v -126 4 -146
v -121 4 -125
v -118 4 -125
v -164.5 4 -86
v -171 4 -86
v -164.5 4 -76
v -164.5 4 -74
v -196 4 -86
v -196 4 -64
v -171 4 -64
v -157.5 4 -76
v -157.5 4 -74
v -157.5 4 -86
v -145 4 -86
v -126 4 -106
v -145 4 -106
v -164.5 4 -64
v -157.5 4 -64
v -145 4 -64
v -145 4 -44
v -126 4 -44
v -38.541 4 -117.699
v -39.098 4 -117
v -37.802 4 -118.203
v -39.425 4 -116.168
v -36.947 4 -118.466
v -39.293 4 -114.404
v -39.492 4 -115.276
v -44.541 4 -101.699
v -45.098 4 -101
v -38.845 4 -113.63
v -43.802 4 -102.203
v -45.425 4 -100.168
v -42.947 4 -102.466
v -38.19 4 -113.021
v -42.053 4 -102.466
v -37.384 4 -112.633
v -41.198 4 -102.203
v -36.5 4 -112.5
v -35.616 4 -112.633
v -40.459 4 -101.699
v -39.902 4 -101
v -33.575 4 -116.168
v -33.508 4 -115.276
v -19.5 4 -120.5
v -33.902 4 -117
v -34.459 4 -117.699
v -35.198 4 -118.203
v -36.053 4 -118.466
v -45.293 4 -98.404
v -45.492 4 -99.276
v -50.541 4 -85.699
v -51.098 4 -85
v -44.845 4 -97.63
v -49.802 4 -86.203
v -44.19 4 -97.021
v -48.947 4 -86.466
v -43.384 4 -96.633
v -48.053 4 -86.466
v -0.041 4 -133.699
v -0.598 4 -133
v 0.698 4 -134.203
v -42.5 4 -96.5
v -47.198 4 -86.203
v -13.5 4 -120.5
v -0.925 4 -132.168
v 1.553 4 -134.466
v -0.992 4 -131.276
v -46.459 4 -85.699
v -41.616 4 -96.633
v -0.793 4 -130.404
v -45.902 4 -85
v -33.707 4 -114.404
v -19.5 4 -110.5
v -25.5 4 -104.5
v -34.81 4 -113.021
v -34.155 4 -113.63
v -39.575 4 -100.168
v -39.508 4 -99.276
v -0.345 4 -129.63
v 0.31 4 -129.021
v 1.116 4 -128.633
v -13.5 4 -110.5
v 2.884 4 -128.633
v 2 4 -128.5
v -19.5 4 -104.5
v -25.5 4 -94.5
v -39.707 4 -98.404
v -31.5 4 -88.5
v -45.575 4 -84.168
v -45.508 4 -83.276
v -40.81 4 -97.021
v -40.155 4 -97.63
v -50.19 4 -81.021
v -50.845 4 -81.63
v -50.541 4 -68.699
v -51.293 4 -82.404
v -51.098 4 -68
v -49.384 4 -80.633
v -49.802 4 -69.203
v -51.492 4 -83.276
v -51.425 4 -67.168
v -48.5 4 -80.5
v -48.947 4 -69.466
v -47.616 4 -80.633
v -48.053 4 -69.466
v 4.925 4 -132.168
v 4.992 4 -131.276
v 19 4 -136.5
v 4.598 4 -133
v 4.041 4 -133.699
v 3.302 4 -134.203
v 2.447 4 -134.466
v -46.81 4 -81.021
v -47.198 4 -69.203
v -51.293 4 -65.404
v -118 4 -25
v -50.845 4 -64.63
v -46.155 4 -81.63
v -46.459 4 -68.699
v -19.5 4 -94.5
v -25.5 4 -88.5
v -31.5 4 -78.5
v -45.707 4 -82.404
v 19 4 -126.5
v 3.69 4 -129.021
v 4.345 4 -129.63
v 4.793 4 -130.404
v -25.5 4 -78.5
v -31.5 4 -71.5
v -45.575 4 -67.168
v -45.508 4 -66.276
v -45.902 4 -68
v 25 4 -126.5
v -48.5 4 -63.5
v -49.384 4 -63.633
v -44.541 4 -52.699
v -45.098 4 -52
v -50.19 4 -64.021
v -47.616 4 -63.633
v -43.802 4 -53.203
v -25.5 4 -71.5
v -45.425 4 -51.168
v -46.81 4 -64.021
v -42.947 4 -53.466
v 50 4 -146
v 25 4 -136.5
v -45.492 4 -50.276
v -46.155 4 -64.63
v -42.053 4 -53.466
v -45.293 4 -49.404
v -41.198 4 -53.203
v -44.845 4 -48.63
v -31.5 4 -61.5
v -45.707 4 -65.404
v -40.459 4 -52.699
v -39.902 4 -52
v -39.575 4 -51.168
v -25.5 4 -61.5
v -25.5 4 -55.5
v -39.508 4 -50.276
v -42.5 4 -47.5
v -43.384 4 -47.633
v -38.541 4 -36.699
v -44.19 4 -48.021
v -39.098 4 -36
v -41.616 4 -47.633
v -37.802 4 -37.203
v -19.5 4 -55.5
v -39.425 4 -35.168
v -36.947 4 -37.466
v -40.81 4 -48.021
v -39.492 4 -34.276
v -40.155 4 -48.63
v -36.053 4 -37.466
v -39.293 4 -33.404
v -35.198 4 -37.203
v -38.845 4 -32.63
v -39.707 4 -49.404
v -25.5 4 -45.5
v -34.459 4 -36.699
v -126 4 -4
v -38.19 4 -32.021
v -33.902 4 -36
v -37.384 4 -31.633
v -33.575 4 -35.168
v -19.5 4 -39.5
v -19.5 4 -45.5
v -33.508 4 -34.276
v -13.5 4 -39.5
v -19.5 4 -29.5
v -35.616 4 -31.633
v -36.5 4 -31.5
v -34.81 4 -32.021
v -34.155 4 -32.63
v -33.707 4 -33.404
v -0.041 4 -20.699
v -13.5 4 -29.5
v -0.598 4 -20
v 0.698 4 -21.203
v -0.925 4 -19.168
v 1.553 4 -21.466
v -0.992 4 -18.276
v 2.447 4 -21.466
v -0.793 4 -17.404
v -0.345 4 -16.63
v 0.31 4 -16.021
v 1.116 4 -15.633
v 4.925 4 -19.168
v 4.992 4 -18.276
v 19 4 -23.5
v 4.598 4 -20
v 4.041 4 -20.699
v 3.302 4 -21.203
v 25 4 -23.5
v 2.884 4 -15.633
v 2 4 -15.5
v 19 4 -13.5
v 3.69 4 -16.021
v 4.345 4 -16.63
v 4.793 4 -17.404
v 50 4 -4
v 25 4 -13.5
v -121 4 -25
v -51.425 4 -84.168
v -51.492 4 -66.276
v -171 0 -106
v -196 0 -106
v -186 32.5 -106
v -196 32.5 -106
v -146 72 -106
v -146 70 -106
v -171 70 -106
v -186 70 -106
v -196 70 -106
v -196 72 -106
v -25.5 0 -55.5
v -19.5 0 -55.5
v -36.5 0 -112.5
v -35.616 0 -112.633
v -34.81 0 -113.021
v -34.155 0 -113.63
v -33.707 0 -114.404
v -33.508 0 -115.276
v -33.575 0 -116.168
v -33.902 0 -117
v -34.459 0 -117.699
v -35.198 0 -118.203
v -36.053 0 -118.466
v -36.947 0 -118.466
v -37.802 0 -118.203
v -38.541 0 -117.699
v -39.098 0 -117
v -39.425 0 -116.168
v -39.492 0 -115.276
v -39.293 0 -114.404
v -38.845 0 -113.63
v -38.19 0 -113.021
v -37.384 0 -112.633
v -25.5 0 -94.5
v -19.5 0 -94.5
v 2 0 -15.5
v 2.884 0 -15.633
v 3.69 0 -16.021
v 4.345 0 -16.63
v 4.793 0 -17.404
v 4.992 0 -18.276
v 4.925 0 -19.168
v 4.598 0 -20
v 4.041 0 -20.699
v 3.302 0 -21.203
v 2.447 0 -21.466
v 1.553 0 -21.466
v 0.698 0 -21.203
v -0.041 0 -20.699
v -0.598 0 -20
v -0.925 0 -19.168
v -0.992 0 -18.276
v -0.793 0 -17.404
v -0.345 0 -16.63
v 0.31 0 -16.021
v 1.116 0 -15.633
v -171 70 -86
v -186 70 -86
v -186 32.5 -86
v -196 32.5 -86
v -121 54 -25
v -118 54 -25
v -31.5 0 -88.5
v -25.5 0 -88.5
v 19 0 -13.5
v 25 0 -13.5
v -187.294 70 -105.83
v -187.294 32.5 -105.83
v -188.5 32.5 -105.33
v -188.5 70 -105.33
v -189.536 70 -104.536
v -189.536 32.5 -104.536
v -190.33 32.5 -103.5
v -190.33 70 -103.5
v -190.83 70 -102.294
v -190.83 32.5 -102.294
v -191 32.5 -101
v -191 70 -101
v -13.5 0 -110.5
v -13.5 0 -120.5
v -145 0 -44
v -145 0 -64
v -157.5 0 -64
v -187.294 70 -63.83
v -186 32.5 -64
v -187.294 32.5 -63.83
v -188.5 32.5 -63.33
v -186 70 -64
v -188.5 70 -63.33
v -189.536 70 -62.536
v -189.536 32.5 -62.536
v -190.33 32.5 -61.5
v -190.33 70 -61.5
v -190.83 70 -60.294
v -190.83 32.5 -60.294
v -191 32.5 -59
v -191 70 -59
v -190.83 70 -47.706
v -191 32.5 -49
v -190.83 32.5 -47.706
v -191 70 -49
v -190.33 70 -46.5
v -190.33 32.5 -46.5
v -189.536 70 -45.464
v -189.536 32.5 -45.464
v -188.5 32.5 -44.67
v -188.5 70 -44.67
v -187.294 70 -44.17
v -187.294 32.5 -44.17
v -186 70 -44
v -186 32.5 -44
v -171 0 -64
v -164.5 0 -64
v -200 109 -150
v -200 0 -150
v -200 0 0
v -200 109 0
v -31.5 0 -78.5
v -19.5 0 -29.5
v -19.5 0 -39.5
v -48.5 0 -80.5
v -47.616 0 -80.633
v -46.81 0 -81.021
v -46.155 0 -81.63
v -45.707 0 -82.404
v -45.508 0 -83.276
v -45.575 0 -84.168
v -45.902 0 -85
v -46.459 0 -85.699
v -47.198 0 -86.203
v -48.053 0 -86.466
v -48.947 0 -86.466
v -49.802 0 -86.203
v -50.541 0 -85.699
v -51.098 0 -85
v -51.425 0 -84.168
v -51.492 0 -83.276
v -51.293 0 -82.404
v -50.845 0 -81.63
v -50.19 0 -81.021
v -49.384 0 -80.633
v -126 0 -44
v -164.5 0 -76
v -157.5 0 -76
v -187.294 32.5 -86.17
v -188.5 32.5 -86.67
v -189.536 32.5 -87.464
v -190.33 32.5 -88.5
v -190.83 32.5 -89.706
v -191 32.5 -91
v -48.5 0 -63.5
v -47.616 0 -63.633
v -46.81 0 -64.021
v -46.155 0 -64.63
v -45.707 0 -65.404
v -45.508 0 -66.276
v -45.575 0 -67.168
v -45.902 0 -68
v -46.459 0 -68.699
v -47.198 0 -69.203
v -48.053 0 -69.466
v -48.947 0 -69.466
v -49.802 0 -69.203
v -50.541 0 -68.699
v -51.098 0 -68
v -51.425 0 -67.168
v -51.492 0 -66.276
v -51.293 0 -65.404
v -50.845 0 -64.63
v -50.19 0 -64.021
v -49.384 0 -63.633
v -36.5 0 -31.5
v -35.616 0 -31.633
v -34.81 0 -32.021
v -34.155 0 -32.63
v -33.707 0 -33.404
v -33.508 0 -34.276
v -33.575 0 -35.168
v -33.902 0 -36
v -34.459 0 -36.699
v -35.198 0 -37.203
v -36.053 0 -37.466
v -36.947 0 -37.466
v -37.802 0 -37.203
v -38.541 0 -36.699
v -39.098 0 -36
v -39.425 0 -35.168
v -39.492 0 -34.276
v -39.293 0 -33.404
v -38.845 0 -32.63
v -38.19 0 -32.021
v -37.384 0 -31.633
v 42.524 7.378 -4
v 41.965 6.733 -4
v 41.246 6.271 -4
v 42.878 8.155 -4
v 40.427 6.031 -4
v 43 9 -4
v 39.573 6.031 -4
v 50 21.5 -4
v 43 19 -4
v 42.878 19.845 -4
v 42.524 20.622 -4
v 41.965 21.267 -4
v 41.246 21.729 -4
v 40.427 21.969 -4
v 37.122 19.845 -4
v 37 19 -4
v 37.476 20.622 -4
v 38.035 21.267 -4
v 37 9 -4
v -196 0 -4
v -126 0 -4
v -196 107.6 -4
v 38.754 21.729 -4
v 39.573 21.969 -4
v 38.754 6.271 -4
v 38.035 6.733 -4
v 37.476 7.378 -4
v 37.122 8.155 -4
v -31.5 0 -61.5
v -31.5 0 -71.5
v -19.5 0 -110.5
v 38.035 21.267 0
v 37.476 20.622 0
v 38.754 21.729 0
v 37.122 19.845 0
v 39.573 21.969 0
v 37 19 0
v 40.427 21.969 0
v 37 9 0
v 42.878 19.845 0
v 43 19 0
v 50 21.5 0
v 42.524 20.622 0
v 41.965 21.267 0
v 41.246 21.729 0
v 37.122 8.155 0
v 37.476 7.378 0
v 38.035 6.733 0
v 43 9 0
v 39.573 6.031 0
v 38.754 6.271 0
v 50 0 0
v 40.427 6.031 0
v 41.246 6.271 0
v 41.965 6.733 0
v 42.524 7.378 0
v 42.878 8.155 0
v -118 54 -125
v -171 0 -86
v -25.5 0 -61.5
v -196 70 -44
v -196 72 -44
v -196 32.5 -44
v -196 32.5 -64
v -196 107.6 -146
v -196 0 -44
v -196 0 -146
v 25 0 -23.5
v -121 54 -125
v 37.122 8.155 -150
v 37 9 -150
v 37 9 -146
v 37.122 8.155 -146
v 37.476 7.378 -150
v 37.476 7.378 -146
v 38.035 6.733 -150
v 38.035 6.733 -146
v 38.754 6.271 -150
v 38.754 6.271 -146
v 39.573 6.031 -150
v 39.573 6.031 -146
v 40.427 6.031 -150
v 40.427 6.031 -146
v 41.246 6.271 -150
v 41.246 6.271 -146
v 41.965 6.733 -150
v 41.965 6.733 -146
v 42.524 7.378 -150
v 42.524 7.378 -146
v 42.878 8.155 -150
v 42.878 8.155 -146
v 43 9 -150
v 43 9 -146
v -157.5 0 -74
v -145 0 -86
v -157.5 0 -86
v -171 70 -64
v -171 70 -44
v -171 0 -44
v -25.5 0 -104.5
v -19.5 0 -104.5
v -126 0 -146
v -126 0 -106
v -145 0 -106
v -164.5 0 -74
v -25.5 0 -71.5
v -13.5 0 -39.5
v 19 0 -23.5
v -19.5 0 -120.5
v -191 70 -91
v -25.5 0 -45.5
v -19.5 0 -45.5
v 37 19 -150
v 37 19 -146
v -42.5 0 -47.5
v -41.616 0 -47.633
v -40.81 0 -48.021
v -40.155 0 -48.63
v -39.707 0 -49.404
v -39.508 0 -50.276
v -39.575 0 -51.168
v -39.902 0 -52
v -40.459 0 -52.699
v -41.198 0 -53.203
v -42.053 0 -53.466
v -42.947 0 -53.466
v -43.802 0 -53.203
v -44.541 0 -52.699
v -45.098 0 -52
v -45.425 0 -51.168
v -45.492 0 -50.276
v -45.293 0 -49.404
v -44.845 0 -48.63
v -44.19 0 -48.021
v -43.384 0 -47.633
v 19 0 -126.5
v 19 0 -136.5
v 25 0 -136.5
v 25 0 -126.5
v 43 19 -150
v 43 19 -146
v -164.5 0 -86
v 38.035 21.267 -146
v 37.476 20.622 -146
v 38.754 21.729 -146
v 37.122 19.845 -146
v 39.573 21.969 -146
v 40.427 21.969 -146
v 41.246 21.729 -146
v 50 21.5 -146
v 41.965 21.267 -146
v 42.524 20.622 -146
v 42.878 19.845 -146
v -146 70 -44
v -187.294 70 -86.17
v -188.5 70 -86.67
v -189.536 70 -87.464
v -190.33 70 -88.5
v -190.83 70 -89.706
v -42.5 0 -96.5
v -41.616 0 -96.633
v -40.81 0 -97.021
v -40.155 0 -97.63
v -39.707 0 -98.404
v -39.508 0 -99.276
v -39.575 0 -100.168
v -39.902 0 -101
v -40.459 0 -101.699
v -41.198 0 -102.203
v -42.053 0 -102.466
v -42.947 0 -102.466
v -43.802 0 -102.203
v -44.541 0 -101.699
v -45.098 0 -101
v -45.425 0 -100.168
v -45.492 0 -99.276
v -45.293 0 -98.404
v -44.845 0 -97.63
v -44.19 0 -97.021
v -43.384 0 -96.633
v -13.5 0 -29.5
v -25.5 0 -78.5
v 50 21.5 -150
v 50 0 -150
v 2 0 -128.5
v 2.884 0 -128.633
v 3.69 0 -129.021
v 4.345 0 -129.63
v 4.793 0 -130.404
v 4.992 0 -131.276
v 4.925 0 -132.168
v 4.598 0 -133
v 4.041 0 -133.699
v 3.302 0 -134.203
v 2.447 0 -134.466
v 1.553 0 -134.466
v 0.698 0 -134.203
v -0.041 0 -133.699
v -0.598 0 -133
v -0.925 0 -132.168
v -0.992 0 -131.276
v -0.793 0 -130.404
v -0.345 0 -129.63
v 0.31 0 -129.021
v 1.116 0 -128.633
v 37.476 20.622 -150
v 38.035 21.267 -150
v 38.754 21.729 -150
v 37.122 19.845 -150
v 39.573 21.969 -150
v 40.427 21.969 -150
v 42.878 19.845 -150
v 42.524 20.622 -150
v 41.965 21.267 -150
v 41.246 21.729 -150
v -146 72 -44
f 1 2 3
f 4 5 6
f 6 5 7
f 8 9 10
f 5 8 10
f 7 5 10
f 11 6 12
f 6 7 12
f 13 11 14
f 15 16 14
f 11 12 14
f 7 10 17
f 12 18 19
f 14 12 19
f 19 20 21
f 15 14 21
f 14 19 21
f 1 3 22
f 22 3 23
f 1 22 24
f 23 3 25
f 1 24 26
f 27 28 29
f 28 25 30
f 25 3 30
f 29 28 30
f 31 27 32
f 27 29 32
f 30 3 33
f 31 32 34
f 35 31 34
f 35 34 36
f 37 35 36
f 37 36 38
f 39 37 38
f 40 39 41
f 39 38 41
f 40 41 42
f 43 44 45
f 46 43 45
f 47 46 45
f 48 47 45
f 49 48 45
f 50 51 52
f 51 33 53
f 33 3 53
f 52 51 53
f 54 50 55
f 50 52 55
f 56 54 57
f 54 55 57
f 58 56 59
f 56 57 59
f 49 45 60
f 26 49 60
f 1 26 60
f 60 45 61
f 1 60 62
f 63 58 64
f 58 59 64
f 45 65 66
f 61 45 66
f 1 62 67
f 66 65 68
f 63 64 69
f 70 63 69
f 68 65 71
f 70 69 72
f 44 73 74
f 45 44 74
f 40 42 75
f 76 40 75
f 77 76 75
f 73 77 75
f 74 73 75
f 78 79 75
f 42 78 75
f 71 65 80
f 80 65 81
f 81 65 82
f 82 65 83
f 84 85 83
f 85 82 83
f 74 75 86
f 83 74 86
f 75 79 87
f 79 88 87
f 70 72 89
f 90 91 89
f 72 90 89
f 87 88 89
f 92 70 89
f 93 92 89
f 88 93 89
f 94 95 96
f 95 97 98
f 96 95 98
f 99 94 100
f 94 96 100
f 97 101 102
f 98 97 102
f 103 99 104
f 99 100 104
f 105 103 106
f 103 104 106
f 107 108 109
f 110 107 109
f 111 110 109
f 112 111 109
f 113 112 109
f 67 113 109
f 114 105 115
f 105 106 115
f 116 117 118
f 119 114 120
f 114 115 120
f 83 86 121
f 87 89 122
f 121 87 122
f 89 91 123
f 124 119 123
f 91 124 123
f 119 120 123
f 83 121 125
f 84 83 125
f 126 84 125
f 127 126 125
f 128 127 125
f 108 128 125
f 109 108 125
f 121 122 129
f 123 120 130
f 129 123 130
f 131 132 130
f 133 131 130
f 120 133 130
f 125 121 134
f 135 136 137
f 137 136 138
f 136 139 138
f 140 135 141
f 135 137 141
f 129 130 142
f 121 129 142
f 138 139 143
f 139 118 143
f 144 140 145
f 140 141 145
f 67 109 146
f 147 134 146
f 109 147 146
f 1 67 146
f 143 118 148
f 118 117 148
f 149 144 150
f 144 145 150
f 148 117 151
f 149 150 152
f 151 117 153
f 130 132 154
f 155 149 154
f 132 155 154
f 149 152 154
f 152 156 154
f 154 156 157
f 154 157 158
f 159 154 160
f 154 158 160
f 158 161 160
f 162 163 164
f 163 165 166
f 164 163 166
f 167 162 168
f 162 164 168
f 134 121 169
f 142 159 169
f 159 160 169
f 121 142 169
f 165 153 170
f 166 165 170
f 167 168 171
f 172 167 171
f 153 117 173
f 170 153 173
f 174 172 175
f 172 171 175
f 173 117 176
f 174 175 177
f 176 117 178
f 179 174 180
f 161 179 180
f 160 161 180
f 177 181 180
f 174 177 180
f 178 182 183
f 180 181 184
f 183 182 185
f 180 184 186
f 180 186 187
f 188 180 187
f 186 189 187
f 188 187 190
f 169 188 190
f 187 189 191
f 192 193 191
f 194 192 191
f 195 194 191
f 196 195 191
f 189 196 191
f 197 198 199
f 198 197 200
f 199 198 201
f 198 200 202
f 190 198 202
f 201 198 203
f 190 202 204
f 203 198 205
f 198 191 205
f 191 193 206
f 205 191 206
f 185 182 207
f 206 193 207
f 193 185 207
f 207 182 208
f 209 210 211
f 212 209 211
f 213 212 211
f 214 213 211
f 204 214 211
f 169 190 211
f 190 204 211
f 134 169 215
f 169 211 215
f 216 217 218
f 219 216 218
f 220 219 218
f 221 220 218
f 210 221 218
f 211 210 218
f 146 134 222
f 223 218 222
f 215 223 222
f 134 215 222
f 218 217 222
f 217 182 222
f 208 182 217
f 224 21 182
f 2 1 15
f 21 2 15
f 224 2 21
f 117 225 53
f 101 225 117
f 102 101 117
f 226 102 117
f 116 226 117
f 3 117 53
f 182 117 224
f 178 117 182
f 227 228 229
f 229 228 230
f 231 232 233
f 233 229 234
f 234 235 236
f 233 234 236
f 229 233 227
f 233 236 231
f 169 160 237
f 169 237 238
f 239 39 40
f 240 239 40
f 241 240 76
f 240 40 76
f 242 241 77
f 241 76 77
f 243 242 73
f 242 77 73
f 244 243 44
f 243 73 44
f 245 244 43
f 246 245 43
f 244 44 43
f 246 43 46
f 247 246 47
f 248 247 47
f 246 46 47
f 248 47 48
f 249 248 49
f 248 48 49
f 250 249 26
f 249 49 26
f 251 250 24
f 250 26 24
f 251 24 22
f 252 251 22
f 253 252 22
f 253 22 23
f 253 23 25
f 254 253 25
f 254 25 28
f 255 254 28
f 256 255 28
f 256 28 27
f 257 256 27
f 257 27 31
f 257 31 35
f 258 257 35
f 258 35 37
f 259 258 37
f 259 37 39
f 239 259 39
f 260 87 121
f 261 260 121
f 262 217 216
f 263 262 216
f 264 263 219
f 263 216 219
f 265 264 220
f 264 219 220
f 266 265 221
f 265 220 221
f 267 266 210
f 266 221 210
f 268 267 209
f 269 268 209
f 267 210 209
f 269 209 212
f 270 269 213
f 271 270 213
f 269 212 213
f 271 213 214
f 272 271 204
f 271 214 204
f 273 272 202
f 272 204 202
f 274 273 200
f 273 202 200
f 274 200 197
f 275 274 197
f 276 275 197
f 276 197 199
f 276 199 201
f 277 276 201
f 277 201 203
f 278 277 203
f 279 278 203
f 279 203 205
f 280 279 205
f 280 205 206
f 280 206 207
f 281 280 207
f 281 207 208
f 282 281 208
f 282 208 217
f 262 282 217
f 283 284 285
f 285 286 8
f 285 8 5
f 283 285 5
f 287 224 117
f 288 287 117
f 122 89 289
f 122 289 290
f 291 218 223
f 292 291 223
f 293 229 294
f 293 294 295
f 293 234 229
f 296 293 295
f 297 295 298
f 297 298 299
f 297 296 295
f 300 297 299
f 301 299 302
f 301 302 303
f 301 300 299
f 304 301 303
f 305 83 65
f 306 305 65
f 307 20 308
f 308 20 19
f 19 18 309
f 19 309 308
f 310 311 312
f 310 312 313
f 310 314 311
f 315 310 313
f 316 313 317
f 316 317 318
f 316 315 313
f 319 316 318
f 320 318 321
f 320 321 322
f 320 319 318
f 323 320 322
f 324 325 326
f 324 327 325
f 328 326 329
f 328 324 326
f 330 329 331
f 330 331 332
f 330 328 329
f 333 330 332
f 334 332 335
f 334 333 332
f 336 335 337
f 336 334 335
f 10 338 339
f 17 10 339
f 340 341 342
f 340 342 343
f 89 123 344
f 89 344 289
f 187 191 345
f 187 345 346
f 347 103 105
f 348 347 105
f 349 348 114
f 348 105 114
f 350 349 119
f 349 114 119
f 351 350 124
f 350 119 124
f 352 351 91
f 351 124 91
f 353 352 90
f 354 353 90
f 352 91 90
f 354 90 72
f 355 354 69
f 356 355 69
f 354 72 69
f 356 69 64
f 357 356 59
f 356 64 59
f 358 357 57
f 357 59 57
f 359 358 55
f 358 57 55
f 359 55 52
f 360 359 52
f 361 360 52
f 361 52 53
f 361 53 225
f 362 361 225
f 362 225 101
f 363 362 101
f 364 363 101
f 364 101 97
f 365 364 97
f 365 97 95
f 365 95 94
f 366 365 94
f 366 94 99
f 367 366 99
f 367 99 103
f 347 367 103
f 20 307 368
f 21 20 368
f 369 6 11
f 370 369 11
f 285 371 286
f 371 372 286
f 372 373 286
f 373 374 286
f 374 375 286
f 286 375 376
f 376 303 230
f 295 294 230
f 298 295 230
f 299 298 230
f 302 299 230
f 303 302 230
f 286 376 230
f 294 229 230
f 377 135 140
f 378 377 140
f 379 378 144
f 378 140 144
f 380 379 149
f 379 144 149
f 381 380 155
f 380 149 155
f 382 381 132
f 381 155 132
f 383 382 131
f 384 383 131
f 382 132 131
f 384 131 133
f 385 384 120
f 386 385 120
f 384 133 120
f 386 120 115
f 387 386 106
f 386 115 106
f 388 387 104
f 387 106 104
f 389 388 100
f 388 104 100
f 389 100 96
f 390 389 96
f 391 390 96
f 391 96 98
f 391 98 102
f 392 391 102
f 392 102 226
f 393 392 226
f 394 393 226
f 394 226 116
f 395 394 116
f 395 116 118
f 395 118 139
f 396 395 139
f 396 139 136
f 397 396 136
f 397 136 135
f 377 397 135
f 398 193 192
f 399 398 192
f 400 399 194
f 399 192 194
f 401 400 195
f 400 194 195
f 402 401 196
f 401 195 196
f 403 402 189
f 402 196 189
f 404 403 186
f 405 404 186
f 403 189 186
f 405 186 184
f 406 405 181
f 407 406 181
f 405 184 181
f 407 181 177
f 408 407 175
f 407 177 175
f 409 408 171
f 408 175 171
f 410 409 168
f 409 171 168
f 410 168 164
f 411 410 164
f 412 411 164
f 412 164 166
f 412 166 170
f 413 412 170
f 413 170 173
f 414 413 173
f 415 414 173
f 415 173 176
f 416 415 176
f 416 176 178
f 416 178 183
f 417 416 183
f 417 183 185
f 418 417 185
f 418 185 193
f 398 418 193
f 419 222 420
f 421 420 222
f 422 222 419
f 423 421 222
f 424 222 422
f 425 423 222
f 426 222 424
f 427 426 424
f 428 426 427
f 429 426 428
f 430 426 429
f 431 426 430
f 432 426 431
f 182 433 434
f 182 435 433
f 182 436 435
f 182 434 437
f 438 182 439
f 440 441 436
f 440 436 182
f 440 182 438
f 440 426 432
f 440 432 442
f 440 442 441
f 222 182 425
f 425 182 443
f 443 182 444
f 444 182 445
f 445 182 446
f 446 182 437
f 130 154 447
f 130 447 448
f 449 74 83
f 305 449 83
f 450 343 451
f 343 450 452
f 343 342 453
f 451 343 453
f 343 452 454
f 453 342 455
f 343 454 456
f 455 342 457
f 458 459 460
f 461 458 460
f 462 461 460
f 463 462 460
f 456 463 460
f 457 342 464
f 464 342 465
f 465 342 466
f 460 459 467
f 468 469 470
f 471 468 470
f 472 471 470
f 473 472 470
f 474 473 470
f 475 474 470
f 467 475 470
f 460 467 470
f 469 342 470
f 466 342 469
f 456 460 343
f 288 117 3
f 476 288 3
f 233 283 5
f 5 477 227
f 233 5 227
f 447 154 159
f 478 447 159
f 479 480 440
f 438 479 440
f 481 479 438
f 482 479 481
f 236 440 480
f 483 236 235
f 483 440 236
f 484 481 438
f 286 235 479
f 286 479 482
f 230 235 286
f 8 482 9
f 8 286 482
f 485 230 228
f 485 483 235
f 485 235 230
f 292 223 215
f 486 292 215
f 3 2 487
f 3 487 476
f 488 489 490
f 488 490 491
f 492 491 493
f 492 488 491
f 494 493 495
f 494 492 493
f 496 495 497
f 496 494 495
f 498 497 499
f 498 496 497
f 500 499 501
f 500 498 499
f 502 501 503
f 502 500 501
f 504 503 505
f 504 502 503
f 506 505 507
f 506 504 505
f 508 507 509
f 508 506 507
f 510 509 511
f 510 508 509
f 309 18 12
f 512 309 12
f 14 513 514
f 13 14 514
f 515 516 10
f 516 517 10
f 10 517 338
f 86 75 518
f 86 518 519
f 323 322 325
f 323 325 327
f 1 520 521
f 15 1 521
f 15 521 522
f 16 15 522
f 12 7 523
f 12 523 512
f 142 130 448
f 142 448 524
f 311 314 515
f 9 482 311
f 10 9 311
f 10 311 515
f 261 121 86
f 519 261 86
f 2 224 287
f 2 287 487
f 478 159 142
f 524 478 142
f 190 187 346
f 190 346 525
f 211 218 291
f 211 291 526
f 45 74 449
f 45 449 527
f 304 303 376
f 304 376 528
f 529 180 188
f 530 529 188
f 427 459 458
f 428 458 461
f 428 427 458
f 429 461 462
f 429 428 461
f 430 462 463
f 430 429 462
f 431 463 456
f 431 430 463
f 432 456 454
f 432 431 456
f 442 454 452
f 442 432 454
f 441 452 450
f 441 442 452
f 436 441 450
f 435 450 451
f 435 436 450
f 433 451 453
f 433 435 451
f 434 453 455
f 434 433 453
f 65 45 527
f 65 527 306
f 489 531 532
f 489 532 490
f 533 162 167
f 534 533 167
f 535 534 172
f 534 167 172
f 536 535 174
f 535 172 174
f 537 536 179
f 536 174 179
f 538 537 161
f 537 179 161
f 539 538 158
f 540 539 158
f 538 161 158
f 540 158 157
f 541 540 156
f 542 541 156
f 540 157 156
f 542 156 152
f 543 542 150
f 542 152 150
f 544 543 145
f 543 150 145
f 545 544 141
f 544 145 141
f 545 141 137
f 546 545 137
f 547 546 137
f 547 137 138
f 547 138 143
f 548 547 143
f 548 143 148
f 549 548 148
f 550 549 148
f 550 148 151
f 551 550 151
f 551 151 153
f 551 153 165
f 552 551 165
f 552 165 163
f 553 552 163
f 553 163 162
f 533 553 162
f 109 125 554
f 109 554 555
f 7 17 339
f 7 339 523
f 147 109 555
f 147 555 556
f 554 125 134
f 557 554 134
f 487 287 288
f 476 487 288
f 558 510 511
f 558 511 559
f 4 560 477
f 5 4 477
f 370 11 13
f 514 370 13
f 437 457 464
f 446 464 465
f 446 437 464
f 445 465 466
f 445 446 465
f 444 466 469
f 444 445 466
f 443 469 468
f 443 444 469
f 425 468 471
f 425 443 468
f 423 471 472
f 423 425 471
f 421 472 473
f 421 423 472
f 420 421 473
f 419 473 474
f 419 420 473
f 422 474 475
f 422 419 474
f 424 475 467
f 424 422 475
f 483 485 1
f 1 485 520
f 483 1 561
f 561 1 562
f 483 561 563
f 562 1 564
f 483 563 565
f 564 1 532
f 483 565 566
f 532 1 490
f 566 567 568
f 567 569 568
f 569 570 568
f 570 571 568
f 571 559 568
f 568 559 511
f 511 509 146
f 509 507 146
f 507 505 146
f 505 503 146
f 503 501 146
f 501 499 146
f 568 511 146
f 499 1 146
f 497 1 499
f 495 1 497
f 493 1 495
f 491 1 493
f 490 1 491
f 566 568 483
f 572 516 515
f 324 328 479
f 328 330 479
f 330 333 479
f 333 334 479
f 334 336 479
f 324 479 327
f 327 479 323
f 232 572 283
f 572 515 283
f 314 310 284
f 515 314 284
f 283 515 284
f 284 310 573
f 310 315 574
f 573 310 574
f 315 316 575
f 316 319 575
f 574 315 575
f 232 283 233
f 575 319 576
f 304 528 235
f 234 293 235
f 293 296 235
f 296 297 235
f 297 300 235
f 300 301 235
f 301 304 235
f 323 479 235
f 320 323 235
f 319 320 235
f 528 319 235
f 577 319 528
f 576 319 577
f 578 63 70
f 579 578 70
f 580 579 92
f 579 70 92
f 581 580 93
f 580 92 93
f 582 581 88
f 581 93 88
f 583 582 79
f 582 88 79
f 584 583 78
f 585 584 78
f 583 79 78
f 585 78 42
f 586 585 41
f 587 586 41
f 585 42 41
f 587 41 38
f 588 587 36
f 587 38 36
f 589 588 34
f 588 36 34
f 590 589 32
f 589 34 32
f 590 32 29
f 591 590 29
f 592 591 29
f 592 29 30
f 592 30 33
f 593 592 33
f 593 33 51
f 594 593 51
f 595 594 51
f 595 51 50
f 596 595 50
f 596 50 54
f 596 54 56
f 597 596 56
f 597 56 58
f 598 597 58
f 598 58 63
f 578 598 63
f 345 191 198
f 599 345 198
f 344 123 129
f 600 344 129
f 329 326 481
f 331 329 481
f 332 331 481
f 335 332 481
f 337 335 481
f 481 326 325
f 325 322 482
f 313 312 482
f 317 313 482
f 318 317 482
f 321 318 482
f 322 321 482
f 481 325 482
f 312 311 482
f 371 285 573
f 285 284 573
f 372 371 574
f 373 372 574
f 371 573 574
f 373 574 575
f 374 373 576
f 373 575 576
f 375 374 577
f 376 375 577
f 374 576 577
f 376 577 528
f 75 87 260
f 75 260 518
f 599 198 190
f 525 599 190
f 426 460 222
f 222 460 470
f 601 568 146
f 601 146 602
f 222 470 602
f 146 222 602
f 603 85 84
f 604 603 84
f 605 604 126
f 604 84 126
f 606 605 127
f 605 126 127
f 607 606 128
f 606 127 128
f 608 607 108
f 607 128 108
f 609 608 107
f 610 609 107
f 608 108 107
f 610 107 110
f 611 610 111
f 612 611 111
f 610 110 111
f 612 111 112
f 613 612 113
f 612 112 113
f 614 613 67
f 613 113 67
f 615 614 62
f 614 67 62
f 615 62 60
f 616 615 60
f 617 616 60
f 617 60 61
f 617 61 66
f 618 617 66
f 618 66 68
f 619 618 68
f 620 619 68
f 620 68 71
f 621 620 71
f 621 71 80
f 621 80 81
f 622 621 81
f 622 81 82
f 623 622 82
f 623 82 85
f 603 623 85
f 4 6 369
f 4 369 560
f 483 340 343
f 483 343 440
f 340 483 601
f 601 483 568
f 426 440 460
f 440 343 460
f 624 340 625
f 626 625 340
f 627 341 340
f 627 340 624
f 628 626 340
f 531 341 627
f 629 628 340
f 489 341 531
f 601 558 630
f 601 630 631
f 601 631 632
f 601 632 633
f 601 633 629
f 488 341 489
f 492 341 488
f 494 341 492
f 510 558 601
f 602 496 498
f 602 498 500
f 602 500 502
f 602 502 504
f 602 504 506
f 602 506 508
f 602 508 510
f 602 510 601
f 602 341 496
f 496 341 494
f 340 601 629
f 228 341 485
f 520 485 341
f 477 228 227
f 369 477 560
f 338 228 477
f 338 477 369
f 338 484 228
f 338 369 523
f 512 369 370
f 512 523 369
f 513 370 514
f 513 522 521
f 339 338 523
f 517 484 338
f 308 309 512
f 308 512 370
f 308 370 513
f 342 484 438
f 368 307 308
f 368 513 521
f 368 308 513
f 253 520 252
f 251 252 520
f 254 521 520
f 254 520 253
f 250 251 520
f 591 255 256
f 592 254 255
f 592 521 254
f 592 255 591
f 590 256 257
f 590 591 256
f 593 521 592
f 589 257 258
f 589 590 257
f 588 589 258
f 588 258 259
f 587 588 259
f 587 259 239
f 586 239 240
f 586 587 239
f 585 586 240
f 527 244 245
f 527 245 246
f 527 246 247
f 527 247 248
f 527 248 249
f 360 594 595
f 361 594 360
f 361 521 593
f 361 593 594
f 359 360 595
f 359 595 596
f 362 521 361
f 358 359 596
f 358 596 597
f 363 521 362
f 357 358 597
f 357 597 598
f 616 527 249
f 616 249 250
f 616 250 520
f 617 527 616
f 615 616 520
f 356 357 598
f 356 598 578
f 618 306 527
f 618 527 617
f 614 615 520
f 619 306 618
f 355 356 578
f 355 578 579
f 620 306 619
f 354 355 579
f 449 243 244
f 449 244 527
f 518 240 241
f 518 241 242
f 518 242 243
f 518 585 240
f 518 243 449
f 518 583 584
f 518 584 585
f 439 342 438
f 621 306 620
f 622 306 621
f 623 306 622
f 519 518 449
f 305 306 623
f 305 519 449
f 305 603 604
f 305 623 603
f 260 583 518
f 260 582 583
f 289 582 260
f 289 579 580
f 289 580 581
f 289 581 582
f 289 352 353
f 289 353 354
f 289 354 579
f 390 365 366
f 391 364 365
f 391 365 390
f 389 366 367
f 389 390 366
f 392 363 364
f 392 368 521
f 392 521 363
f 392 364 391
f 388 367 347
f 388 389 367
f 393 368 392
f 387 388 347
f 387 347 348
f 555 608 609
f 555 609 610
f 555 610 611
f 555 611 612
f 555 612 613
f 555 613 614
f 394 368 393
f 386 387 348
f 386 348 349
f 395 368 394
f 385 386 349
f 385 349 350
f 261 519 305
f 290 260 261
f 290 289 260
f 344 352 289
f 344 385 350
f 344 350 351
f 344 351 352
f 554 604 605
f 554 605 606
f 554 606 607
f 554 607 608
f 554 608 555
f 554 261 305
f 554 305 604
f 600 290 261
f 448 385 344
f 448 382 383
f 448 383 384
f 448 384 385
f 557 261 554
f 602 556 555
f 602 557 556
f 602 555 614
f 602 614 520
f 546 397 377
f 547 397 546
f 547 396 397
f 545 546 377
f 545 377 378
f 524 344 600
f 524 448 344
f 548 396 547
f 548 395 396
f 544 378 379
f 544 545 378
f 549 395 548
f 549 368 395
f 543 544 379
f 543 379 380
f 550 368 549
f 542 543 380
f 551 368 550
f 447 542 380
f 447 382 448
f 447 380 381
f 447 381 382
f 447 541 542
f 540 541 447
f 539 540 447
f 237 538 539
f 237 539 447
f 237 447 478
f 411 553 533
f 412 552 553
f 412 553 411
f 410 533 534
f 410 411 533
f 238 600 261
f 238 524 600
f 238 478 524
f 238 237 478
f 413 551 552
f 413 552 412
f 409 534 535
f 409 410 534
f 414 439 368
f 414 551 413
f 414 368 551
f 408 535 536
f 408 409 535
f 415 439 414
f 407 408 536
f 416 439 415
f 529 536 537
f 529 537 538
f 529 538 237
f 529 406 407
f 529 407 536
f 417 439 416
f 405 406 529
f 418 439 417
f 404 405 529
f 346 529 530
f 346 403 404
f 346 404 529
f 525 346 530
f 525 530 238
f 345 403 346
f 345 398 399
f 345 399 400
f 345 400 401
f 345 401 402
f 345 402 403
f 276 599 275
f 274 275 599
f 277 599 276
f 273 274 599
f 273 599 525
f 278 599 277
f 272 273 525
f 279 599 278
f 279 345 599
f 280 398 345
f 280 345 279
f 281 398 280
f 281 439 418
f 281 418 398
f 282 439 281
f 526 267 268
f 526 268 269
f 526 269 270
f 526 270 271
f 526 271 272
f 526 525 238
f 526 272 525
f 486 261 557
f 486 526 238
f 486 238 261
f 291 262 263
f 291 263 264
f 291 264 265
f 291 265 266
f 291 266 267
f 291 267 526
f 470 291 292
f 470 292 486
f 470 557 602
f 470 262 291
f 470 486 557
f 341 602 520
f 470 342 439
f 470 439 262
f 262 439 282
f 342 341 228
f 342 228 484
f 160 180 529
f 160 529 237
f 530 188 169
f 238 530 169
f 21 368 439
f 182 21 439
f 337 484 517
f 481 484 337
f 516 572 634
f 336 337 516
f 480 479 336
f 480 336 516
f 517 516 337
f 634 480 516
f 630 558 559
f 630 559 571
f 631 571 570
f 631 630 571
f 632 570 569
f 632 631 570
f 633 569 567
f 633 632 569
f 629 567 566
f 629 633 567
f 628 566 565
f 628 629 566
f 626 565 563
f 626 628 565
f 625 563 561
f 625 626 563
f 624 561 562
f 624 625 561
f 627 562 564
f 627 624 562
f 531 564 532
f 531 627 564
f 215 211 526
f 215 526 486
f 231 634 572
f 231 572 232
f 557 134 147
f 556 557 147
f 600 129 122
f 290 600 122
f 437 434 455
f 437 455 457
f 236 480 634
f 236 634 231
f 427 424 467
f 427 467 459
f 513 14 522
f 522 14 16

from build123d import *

# Parameters (mm, degrees)
SKETCH1_W            = 200
SKETCH1_H            = 150
SKETCH1_W_2          = 192
SKETCH1_H_2          = 142
BOSS_EXTRUDE2_DEPTH  = 4
SKETCH2_W            = 200
SKETCH2_H            = 150
SKETCH2_W_2          = 192
SKETCH2_H_2          = 142
BOSS_EXTRUDE3_DEPTH  = 80
CUT_EXTRUDE1_DEPTH   = 150
SKETCH4_R            = 3
SKETCH4_W            = 6
SKETCH4_H            = 10
CUT_EXTRUDE2_DEPTH   = 10
SKETCH5_W            = 142
SKETCH5_H            = 11.4
CUT_EXTRUDE4_DEPTH   = 10
SKETCH6_W            = 25
SKETCH6_H            = 20
BOSS_EXTRUDE4_DEPTH  = 66
SKETCH7_W            = 5
SKETCH7_H            = 37.5
CUT_EXTRUDE5_DEPTH   = 66
BOSS_EXTRUDE6_DEPTH  = 4
BOSS_EXTRUDE7_DEPTH  = 4
BOSS_EXTRUDE8_DEPTH  = 142
FILLET1_R            = 5
FILLET2_R            = 5
FILLET3_R            = 5
SKETCH15_W           = 62
SKETCH15_H           = 2
BOSS_EXTRUDE9_DEPTH  = 50
SKETCH16_W           = 6
SKETCH16_H           = 20
CUT_EXTRUDE8_DEPTH   = 50
SKETCH17_W           = 7
SKETCH17_H           = 10
CUT_EXTRUDE9_DEPTH   = 50
SKETCH18_W           = 50
SKETCH18_H           = 150
BOSS_EXTRUDE10_DEPTH = 4
SKETCH19_W           = 50
SKETCH19_H           = 4
BOSS_EXTRUDE11_DEPTH = 35
CUT_EXTRUDE10_DEPTH  = 210
SKETCH21_R           = 3
SKETCH21_W           = 6
SKETCH21_H           = 10
CUT_EXTRUDE11_DEPTH  = 30
SKETCH22_W           = 3
SKETCH22_H           = 100
BOSS_EXTRUDE12_DEPTH = 50
CUT_EXTRUDE12_DEPTH  = 150


with BuildPart() as part:
    # Sketch1 → Boss-Extrude2 (new body)
    # profile 1 of 3: a face of its own
    with BuildSketch(Plane(origin=(0, 0, 0), x_dir=(1, 0, 0), z_dir=(0, 1, 0))):
        with Locations((-100, 75)):
            Rectangle(SKETCH1_W, SKETCH1_H)
        with Locations((-100, 75)):
            Rectangle(SKETCH1_W_2, SKETCH1_H_2, mode=Mode.SUBTRACT)
    # profile 2 of 3: a face of its own
    with BuildSketch(Plane(origin=(0, 0, 0), x_dir=(1, 0, 0), z_dir=(0, 1, 0))):
        Polygon((-4, 75), (-196, 75), (-196, 44), (-171, 44), (-171, 64), (-163, 64), (-163, 74), (-159, 74), (-159, 64), (-151, 64), (-151, 44), (-126, 44), (-126, 4), (-4, 4), align=None)
    # profile 3 of 3: a face of its own
    with BuildSketch(Plane(origin=(0, 0, 0), x_dir=(1, 0, 0), z_dir=(0, 1, 0))):
        Polygon((-196, 106), (-196, 75), (-4, 75), (-4, 146), (-126, 146), (-126, 106), (-151, 106), (-151, 86), (-159, 86), (-159, 76), (-163, 76), (-163, 86), (-171, 86), (-171, 106), align=None)
    extrude(amount=BOSS_EXTRUDE2_DEPTH)

    # Sketch2 → Boss-Extrude3 (add)
    with BuildSketch(Plane(origin=(0, 4, 0), x_dir=(1, 0, 0), z_dir=(0, 1, 0))):
        with Locations((-100, 75)):
            Rectangle(SKETCH2_W, SKETCH2_H)
        with Locations((-100, 75)):
            Rectangle(SKETCH2_W_2, SKETCH2_H_2, mode=Mode.SUBTRACT)
    extrude(amount=BOSS_EXTRUDE3_DEPTH)

    # Sketch3 → Cut-Extrude1 (cut)
    with BuildSketch(Plane.XY):
        Polygon((-200, 84), (0, 14), (0, 84), align=None)
    extrude(amount=-CUT_EXTRUDE1_DEPTH, mode=Mode.SUBTRACT)

    # Sketch4 → Cut-Extrude2 (cut)
    with BuildSketch(Plane(origin=(0, 4, 0), x_dir=(1, 0, 0), z_dir=(0, 1, 0))):
        with Locations(Location((-36.5, 115.5, 0), (0, 0, 270))):
            Circle(SKETCH4_R)
        with Locations(Location((-42.5, 99.5, 0), (0, 0, 270))):
            Circle(SKETCH4_R)
        with Locations(Location((-48.5, 83.5, 0), (0, 0, 270))):
            Circle(SKETCH4_R)
        with Locations(Location((-48.5, 66.5, 0), (0, 0, 270))):
            Circle(SKETCH4_R)
        with Locations(Location((-42.5, 50.5, 0), (0, 0, 270))):
            Circle(SKETCH4_R)
        with Locations(Location((-36.5, 34.5, 0), (0, 0, 270))):
            Circle(SKETCH4_R)
        with Locations((-16.5, 34.5)):
            Rectangle(SKETCH4_W, SKETCH4_H)
        with Locations((-16.5, 115.5)):
            Rectangle(SKETCH4_W, SKETCH4_H)
        with Locations((-22.5, 99.5)):
            Rectangle(SKETCH4_W, SKETCH4_H)
        with Locations((-22.5, 50.5)):
            Rectangle(SKETCH4_W, SKETCH4_H)
        with Locations((-28.5, 66.5)):
            Rectangle(SKETCH4_W, SKETCH4_H)
        with Locations((-28.5, 83.5)):
            Rectangle(SKETCH4_W, SKETCH4_H)
    extrude(amount=-CUT_EXTRUDE2_DEPTH, mode=Mode.SUBTRACT)

    # Sketch5 → Cut-Extrude4 (cut)
    with BuildSketch(Plane(origin=(0, 0, 0), x_dir=(0, 0, -1), z_dir=(1, 0, 0))):
        with Locations((75, 9.7)):
            Rectangle(SKETCH5_W, SKETCH5_H)
    extrude(amount=-CUT_EXTRUDE4_DEPTH, mode=Mode.SUBTRACT)

    # Sketch6 → Boss-Extrude4 (add)
    with BuildSketch(Plane(origin=(0, 4, 0), x_dir=(1, 0, 0), z_dir=(0, 1, 0))):
        with Locations((-183.5, 54)):
            Rectangle(SKETCH6_W, SKETCH6_H)
        with Locations((-183.5, 96)):
            Rectangle(SKETCH6_W, SKETCH6_H)
    extrude(amount=BOSS_EXTRUDE4_DEPTH)

    # Sketch7 → Cut-Extrude5 (cut)
    with BuildSketch(Plane(origin=(0, 0, -106), x_dir=(-1, 0, 0), z_dir=(0, 0, -1))):
        with Locations((193.5, 51.25)):
            Rectangle(SKETCH7_W, SKETCH7_H)
    extrude(amount=-CUT_EXTRUDE5_DEPTH, mode=Mode.SUBTRACT)

    # Sketch12 → Boss-Extrude6 (add)
    with BuildSketch(Plane.XY):
        Polygon((-200, 84), (-200, 109), (0, 39), (0, 14), align=None)
    extrude(amount=-BOSS_EXTRUDE6_DEPTH)

    # Sketch13 → Boss-Extrude7 (add)
    with BuildSketch(Plane(origin=(0, 0, -150), x_dir=(-1, 0, 0), z_dir=(0, 0, -1))):
        Polygon((0, 14), (0, 39), (200, 109), (200, 84), align=None)
    extrude(amount=-BOSS_EXTRUDE7_DEPTH)

    # Sketch14 → Boss-Extrude8 (add)
    with BuildSketch(Plane.XY.offset(-146)):
        Polygon((-200, 84), (-200, 109), (-196, 107.6), (-196, 82.6), align=None)
    extrude(amount=BOSS_EXTRUDE8_DEPTH)

    # Fillet1
    fillet1_edges = [part.edges().sort_by_distance(p)[0] for p in [
        (-191, 51.25, -106),
    ]]
    fillet(fillet1_edges, radius=FILLET1_R)

    # Fillet2
    fillet2_edges = [part.edges().sort_by_distance(p)[0] for p in [
        (-191, 51.25, -86),
    ]]
    fillet(fillet2_edges, radius=FILLET2_R)

    # Fillet3
    fillet3_edges = [part.edges().sort_by_distance(p)[0] for p in [
        (-191, 51.25, -44),
        (-191, 51.25, -64),
    ]]
    fillet(fillet3_edges, radius=FILLET3_R)

    # Sketch15 → Boss-Extrude9 (add)
    with BuildSketch(Plane(origin=(-196, 0, 0), x_dir=(0, 0, -1), z_dir=(1, 0, 0))):
        with Locations((75, 71)):
            Rectangle(SKETCH15_W, SKETCH15_H)
    extrude(amount=BOSS_EXTRUDE9_DEPTH)

    # Sketch16 → Cut-Extrude8 (cut)
    with BuildSketch(Plane(origin=(0, 4, 0), x_dir=(1, 0, 0), z_dir=(0, 1, 0))):
        with Locations((-148, 96)):
            Rectangle(SKETCH16_W, SKETCH16_H)
        with Locations((-148, 54)):
            Rectangle(SKETCH16_W, SKETCH16_H)
    extrude(amount=-CUT_EXTRUDE8_DEPTH, mode=Mode.SUBTRACT)

    # Sketch17 → Cut-Extrude9 (cut)
    with BuildSketch(Plane(origin=(0, 4, 0), x_dir=(1, 0, 0), z_dir=(0, 1, 0))):
        with Locations((-161, 69)):
            Rectangle(SKETCH17_W, SKETCH17_H)
        with Locations((-161, 81)):
            Rectangle(SKETCH17_W, SKETCH17_H)
    extrude(amount=-CUT_EXTRUDE9_DEPTH, mode=Mode.SUBTRACT)

    # Sketch18 → Boss-Extrude10 (add)
    with BuildSketch(Plane.XZ):
        with Locations((25, -75)):
            Rectangle(SKETCH18_W, SKETCH18_H)
    extrude(amount=-BOSS_EXTRUDE10_DEPTH)

    # Sketch19 → Boss-Extrude11 (add)
    with BuildSketch(Plane(origin=(0, 4, 0), x_dir=(1, 0, 0), z_dir=(0, 1, 0))):
        with Locations((25, 148)):
            Rectangle(SKETCH19_W, SKETCH19_H)
        with Locations((25, 2)):
            Rectangle(SKETCH19_W, SKETCH19_H)
    extrude(amount=BOSS_EXTRUDE11_DEPTH)

    # Sketch20 → Cut-Extrude10 (cut)
    with BuildSketch(Plane.XY):
        Polygon((0, 39), (50, 21.5), (50, 39), align=None)
    extrude(amount=-CUT_EXTRUDE10_DEPTH, mode=Mode.SUBTRACT)

    # Sketch21 → Cut-Extrude11 (cut)
    with BuildSketch(Plane(origin=(0, 4, 0), x_dir=(1, 0, 0), z_dir=(0, 1, 0))):
        with Locations(Location((2, 131.5, 0), (0, 0, 270))):
            Circle(SKETCH21_R)
        with Locations(Location((2, 18.5, 0), (0, 0, 270))):
            Circle(SKETCH21_R)
        with Locations((22, 18.5)):
            Rectangle(SKETCH21_W, SKETCH21_H)
        with Locations((22, 131.5)):
            Rectangle(SKETCH21_W, SKETCH21_H)
    extrude(amount=-CUT_EXTRUDE11_DEPTH, mode=Mode.SUBTRACT)

    # Sketch22 → Boss-Extrude12 (add)
    with BuildSketch(Plane(origin=(0, 4, 0), x_dir=(1, 0, 0), z_dir=(0, 1, 0))):
        with Locations((-119.5, 75)):
            Rectangle(SKETCH22_W, SKETCH22_H)
    extrude(amount=BOSS_EXTRUDE12_DEPTH)

    # Sketch23 → Cut-Extrude12 (cut)
    with BuildSketch(Plane(origin=(0, 0, -150), x_dir=(-1, 0, 0), z_dir=(0, 0, -1))):
        with BuildLine():
            Line((-43, 9), (-43, 19))
            ThreePointArc((-43, 19), (-40, 22), (-37, 19))
            Line((-37, 19), (-37, 9))
            ThreePointArc((-37, 9), (-40, 6), (-43, 9))
        make_face()
    extrude(amount=-CUT_EXTRUDE12_DEPTH, mode=Mode.SUBTRACT)


solid = part.part
